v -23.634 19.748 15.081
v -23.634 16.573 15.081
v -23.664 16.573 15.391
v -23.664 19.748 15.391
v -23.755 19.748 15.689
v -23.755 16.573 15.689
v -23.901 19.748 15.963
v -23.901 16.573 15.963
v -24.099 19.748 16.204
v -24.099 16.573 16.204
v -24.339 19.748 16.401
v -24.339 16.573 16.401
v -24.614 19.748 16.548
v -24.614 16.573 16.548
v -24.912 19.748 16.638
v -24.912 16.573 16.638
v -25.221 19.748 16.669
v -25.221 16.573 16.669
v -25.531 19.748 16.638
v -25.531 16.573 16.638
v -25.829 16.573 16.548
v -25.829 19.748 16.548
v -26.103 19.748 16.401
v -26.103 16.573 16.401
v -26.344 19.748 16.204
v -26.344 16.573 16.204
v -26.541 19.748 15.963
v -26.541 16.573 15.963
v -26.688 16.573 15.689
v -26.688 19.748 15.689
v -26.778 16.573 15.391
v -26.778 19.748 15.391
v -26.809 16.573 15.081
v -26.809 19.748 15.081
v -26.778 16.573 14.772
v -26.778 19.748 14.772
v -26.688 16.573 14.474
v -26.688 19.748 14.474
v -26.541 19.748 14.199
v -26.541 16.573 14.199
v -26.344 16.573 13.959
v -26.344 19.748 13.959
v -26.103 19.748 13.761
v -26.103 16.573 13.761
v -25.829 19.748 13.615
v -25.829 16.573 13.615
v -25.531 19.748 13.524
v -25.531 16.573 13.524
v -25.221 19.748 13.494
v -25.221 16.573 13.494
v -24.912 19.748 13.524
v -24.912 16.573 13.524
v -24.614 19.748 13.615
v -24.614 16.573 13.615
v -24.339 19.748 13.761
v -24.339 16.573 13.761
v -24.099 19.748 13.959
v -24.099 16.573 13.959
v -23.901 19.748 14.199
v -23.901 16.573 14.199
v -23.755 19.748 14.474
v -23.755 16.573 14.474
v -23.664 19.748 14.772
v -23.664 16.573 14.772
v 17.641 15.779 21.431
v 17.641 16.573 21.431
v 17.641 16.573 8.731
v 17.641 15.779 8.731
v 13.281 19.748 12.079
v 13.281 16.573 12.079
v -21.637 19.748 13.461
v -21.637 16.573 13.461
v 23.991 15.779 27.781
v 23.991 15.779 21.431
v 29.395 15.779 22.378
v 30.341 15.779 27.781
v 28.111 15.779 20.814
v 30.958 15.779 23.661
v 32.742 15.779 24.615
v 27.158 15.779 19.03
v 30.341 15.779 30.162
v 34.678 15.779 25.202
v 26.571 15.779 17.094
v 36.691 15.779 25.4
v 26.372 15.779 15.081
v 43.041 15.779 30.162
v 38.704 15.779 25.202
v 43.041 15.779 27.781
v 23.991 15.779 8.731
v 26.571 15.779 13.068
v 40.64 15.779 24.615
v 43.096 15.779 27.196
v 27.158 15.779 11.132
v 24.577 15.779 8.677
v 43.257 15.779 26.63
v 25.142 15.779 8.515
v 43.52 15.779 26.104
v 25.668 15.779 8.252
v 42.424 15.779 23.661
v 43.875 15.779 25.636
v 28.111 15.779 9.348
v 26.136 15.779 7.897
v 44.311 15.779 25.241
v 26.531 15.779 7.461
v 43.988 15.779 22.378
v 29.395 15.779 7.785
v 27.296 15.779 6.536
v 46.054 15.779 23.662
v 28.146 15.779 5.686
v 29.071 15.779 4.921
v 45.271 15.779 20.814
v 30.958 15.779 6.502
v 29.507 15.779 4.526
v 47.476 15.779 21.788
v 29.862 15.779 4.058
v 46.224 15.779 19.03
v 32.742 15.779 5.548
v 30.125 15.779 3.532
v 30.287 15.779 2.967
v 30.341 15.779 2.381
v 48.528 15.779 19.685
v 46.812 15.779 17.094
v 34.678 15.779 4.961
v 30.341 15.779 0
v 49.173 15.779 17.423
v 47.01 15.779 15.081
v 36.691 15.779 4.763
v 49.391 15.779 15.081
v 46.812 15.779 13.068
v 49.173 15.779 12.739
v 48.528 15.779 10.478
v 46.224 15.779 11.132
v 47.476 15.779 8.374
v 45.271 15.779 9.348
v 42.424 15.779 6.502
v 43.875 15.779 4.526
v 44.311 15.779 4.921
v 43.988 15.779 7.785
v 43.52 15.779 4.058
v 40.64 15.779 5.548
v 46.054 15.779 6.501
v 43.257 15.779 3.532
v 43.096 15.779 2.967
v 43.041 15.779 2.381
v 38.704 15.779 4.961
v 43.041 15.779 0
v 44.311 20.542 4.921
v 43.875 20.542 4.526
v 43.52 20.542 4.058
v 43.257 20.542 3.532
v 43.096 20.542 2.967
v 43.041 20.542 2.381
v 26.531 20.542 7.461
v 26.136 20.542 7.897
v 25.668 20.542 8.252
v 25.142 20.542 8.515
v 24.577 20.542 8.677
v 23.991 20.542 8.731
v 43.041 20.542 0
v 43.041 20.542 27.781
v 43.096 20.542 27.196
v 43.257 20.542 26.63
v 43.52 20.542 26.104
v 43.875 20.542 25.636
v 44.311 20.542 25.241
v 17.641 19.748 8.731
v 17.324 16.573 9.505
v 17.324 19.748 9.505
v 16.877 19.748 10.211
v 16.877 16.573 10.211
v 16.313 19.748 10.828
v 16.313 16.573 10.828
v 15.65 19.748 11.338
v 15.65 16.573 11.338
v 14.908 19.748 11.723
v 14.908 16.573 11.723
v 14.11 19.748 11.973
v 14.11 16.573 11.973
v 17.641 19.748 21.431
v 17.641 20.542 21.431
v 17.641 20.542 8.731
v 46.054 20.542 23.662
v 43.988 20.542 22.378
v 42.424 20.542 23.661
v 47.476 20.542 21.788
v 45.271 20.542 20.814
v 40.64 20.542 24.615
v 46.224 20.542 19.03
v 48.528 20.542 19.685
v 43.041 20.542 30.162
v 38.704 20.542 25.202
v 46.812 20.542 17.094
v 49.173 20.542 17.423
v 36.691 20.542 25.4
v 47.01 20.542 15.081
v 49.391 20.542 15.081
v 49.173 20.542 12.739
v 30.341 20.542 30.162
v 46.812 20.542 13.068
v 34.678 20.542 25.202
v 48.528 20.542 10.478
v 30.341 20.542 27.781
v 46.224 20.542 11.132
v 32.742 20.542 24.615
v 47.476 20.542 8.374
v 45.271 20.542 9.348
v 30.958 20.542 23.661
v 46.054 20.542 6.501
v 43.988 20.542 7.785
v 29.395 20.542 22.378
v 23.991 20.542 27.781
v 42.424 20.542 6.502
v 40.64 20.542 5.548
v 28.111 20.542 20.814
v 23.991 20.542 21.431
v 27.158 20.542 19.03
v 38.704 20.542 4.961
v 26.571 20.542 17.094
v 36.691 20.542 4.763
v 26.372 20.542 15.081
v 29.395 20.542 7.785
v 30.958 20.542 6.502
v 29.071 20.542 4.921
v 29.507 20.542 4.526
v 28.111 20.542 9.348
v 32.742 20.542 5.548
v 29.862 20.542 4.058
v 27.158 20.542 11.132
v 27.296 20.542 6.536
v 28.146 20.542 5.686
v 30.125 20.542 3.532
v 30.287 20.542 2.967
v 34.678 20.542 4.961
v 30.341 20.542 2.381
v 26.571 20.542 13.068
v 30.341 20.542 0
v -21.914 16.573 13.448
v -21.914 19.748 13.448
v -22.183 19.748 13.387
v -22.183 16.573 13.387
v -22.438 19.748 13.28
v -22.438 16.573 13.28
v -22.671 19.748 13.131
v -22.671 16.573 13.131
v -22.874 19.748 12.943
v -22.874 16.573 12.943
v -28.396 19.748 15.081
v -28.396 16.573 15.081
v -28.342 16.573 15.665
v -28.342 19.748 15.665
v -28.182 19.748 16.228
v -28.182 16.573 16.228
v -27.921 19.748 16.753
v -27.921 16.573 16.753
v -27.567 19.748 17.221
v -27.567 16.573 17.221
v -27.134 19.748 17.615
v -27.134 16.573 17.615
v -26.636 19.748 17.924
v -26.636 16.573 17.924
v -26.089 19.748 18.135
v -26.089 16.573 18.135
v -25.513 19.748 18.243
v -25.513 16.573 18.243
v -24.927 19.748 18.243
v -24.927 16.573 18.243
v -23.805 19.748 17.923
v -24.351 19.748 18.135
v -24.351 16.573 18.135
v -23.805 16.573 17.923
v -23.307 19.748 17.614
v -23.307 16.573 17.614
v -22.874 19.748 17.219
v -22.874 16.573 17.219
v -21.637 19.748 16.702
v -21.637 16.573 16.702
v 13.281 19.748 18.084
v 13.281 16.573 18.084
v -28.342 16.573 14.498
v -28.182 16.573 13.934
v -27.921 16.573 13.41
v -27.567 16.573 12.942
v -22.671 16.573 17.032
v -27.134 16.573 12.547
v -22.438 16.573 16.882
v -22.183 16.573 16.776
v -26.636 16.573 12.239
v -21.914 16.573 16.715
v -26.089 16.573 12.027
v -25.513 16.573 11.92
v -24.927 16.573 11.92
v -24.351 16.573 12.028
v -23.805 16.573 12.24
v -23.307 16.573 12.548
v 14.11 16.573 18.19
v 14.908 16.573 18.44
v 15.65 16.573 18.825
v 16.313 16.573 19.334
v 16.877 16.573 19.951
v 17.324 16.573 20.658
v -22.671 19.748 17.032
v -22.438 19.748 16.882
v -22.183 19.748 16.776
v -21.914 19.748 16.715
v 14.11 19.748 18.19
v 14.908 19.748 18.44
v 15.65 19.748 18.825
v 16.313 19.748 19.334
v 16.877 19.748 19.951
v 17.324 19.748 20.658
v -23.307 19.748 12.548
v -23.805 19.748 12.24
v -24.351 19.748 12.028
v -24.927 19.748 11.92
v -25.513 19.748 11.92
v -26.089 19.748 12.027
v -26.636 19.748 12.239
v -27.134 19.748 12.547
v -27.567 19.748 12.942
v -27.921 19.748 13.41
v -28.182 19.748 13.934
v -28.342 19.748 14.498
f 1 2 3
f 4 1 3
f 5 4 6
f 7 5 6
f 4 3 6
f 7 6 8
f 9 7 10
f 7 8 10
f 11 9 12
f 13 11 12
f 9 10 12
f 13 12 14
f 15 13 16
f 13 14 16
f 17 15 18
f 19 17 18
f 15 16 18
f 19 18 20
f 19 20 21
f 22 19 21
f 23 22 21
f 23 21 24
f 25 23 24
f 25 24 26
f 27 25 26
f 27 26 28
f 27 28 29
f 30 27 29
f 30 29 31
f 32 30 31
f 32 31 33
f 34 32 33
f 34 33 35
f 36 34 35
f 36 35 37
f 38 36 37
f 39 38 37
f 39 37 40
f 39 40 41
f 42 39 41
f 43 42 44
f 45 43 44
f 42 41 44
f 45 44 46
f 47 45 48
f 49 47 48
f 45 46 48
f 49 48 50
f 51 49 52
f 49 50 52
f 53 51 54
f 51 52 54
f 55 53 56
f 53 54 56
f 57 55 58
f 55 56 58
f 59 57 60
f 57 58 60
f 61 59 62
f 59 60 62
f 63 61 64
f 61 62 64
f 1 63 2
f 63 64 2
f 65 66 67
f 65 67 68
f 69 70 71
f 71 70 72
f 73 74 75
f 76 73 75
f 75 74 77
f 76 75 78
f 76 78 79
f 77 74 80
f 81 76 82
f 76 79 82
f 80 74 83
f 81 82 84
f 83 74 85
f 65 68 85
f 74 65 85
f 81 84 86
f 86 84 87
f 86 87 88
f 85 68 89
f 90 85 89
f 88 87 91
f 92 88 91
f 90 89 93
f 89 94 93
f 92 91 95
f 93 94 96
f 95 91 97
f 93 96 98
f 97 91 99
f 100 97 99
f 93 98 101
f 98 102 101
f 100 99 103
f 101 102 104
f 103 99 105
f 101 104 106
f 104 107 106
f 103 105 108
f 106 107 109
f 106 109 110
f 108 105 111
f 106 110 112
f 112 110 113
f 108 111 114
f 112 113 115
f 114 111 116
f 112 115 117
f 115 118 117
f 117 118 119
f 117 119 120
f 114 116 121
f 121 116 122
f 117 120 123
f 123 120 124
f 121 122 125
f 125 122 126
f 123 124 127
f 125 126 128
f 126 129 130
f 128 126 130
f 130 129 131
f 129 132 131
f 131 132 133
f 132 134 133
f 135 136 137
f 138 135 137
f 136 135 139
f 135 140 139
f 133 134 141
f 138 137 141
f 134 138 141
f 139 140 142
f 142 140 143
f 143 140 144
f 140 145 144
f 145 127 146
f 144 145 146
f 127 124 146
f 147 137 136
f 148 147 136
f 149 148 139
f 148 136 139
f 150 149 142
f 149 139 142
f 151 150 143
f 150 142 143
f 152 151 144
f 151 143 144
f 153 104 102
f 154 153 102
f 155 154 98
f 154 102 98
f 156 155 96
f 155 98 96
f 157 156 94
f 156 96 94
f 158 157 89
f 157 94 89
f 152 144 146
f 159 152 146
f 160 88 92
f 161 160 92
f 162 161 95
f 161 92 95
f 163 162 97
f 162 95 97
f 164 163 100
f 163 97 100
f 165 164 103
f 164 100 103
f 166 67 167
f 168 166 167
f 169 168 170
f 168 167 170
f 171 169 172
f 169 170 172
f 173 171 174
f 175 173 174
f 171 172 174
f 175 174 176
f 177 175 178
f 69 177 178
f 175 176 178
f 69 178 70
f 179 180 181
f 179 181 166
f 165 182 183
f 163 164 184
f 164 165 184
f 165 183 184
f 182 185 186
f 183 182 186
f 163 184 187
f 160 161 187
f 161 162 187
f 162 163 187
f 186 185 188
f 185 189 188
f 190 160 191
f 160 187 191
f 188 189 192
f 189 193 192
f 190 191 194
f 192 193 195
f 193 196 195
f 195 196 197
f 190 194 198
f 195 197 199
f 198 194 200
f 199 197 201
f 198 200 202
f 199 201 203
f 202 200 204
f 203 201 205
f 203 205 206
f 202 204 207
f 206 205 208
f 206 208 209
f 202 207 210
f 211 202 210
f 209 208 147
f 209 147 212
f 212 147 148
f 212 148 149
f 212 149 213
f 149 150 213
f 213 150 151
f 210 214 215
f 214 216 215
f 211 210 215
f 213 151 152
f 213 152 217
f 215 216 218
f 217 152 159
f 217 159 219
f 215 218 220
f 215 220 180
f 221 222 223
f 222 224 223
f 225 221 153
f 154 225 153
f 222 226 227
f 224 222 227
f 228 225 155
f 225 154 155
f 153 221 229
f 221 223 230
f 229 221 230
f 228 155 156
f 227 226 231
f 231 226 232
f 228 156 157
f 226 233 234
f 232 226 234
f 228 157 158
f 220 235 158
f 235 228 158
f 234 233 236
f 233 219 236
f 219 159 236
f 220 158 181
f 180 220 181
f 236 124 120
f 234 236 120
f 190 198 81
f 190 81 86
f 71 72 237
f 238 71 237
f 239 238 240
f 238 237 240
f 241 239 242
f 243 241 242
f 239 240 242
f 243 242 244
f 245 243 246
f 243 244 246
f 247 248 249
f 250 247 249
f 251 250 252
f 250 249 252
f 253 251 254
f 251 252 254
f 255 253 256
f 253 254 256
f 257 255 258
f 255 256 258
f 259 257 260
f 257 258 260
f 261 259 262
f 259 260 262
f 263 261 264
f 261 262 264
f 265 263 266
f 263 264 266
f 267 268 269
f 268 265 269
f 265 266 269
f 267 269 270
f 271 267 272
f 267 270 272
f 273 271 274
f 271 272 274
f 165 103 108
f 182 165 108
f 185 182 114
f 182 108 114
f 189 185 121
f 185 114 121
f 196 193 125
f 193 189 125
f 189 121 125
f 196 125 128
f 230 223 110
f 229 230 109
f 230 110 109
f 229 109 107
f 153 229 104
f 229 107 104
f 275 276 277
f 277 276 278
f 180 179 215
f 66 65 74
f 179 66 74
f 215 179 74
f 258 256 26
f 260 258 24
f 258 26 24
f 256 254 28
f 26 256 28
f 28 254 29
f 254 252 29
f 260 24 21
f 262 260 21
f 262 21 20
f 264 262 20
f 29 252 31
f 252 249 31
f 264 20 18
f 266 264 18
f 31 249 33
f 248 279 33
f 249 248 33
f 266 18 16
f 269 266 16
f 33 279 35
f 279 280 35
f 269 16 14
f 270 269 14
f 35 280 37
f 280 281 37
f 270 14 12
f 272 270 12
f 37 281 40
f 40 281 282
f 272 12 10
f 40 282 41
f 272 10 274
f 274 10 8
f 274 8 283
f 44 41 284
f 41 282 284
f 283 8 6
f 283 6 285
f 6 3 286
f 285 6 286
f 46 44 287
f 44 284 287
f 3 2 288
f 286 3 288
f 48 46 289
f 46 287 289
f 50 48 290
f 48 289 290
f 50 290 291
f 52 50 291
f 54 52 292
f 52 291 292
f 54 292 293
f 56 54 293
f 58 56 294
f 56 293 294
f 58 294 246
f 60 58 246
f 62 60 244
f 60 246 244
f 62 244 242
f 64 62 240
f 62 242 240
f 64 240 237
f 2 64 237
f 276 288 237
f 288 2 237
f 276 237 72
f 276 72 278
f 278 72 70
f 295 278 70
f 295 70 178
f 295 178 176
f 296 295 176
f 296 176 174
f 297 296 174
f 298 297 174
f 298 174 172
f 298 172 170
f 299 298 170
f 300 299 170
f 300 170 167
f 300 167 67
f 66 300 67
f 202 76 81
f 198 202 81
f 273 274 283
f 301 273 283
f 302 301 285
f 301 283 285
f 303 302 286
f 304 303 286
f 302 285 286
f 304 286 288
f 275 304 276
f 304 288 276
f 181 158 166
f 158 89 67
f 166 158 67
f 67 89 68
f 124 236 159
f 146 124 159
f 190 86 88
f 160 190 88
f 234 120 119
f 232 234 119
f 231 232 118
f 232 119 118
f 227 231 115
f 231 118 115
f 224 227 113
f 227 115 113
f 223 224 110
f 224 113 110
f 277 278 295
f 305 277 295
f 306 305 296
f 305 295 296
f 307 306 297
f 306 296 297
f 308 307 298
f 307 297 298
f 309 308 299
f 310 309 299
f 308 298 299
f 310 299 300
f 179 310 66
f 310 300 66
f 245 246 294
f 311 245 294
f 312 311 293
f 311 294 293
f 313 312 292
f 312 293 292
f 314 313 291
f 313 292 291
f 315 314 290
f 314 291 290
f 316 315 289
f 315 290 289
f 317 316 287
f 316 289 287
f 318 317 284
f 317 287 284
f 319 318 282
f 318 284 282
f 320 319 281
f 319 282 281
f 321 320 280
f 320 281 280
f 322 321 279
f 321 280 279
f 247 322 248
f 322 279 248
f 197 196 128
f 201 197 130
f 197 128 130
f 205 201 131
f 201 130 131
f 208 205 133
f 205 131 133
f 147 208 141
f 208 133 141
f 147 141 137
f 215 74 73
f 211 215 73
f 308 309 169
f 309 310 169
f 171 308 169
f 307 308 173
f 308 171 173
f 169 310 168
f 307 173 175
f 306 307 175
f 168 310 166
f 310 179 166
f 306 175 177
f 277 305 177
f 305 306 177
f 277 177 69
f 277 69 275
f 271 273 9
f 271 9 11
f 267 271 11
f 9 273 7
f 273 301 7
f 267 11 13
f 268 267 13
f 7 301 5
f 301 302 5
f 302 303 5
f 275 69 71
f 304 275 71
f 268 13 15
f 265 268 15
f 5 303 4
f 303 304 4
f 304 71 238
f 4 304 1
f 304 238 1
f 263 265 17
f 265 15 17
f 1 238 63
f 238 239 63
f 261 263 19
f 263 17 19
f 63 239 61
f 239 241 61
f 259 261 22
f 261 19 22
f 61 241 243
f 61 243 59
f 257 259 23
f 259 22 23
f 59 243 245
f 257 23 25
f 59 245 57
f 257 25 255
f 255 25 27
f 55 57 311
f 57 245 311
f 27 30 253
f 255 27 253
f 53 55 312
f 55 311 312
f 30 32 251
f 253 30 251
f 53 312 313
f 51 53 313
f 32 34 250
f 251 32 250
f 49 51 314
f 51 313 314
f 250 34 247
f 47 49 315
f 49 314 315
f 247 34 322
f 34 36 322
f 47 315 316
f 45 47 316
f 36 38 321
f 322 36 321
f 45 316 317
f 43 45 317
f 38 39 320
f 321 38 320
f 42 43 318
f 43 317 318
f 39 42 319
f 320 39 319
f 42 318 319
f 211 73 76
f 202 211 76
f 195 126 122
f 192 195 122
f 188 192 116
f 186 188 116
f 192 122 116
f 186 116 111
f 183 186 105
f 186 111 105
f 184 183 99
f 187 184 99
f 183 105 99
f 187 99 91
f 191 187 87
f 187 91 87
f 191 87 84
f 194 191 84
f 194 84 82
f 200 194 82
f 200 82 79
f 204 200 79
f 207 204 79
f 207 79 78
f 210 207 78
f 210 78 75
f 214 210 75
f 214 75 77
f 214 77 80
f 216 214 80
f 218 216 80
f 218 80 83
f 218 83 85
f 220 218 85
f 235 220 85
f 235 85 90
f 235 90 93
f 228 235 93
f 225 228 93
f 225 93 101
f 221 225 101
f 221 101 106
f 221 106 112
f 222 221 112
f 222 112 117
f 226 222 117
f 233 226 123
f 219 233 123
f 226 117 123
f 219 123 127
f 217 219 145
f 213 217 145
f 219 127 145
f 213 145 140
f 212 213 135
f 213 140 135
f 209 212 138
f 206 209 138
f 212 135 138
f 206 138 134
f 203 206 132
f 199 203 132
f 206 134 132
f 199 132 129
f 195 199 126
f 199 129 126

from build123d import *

# Parameters (mm, degrees)
F1_DEPTH = 30.1625
F2_R     = 1.5875
F3_DEPTH = 25.4
F4_R     = 1.5875
F4_R_2   = 10.31875
F5_DEPTH = 25.4


with BuildPart() as f1:
    # F0 (on Top) → F1 (new body)
    with BuildSketch(Plane.XY):
        Polygon((17.641182, 19.748247), (-28.396318, 19.748247), (-28.396318, 16.573247), (17.641182, 16.573247), (17.641182, 15.779497), (49.391182, 15.779497), (49.391182, 20.541997), (17.641182, 20.541997), align=None)
    extrude(amount=F1_DEPTH)

    # F2 (on face) → F3 (cut)
    with BuildSketch(Plane.XZ.offset(-16.573247)):
        with Locations((-25.221318, 15.08125)):
            Circle(F2_R)
        with BuildLine():
            ThreePointArc((-28.396318, 15.08125), (-26.367545, 18.042127), (-22.873931, 17.219099))
            ThreePointArc((-22.873931, 17.219099), (-22.312971, 16.823539), (-21.63746, 16.701765))
            Line((-21.63746, 16.701765), (13.280901, 18.083688))
            ThreePointArc((13.280901, 18.083688), (15.992776, 19.064871), (17.641182, 21.43125))
            Line((17.641182, 21.43125), (17.641182, 30.1625))
            Line((17.641182, 30.1625), (-28.396318, 30.1625))
            Line((-28.396318, 30.1625), (-28.396318, 15.08125))
        make_face()
        with BuildLine():
            ThreePointArc((-21.63746, 13.460735), (-22.312971, 13.338961), (-22.873931, 12.943401))
            ThreePointArc((-22.873931, 12.943401), (-26.367545, 12.120373), (-28.396318, 15.08125))
            Line((-28.396318, 15.08125), (-28.396318, 0))
            Line((-28.396318, 0), (17.641182, 0))
            Line((17.641182, 0), (17.641182, 8.73125))
            ThreePointArc((17.641182, 8.73125), (15.992776, 11.097629), (13.280901, 12.078812))
            Line((13.280901, 12.078812), (-21.63746, 13.460735))
        make_face()
    extrude(amount=-F3_DEPTH, mode=Mode.SUBTRACT)

    # F4 (on face) → F5 (cut)
    with BuildSketch(Plane.XZ.offset(-15.779497)):
        with Locations((-25.221318, 15.08125)):
            Circle(F4_R)
        with BuildLine():
            ThreePointArc((44.311182, 25.24125), (48.050407, 20.760863), (49.391182, 15.08125))
            Line((49.391182, 15.08125), (49.391182, 30.1625))
            Line((49.391182, 30.1625), (43.041182, 30.1625))
            Line((43.041182, 30.1625), (43.041182, 27.78125))
            ThreePointArc((43.041182, 27.78125), (43.376375, 26.361347), (44.311182, 25.24125))
        make_face()
        Polygon((30.341182, 27.78125), (30.341182, 30.1625), (17.641182, 30.1625), (17.641182, 21.43125), (23.991182, 21.43125), (23.991182, 27.78125), align=None)
        with BuildLine():
            Line((49.391182, 0), (49.391182, 15.08125))
            ThreePointArc((49.391182, 15.08125), (48.050407, 9.401637), (44.311182, 4.92125))
            ThreePointArc((44.311182, 4.92125), (43.376375, 3.801153), (43.041182, 2.38125))
            Line((43.041182, 2.38125), (43.041182, 0))
            Line((43.041182, 0), (49.391182, 0))
        make_face()
        with BuildLine():
            Line((17.641182, 0), (30.341182, 0))
            Line((30.341182, 0), (30.341182, 2.38125))
            ThreePointArc((30.341182, 2.38125), (30.005988, 3.801153), (29.071182, 4.92125))
            ThreePointArc((29.071182, 4.92125), (27.710925, 6.100994), (26.531182, 7.46125))
            ThreePointArc((26.531182, 7.46125), (25.411085, 8.396056), (23.991182, 8.73125))
            Line((23.991182, 8.73125), (17.641182, 8.73125))
            Line((17.641182, 8.73125), (17.641182, 0))
        make_face()
        with Locations((36.691182, 15.08125)):
            Circle(F4_R_2)
    extrude(amount=-F5_DEPTH, mode=Mode.SUBTRACT)


solid = f1.part
